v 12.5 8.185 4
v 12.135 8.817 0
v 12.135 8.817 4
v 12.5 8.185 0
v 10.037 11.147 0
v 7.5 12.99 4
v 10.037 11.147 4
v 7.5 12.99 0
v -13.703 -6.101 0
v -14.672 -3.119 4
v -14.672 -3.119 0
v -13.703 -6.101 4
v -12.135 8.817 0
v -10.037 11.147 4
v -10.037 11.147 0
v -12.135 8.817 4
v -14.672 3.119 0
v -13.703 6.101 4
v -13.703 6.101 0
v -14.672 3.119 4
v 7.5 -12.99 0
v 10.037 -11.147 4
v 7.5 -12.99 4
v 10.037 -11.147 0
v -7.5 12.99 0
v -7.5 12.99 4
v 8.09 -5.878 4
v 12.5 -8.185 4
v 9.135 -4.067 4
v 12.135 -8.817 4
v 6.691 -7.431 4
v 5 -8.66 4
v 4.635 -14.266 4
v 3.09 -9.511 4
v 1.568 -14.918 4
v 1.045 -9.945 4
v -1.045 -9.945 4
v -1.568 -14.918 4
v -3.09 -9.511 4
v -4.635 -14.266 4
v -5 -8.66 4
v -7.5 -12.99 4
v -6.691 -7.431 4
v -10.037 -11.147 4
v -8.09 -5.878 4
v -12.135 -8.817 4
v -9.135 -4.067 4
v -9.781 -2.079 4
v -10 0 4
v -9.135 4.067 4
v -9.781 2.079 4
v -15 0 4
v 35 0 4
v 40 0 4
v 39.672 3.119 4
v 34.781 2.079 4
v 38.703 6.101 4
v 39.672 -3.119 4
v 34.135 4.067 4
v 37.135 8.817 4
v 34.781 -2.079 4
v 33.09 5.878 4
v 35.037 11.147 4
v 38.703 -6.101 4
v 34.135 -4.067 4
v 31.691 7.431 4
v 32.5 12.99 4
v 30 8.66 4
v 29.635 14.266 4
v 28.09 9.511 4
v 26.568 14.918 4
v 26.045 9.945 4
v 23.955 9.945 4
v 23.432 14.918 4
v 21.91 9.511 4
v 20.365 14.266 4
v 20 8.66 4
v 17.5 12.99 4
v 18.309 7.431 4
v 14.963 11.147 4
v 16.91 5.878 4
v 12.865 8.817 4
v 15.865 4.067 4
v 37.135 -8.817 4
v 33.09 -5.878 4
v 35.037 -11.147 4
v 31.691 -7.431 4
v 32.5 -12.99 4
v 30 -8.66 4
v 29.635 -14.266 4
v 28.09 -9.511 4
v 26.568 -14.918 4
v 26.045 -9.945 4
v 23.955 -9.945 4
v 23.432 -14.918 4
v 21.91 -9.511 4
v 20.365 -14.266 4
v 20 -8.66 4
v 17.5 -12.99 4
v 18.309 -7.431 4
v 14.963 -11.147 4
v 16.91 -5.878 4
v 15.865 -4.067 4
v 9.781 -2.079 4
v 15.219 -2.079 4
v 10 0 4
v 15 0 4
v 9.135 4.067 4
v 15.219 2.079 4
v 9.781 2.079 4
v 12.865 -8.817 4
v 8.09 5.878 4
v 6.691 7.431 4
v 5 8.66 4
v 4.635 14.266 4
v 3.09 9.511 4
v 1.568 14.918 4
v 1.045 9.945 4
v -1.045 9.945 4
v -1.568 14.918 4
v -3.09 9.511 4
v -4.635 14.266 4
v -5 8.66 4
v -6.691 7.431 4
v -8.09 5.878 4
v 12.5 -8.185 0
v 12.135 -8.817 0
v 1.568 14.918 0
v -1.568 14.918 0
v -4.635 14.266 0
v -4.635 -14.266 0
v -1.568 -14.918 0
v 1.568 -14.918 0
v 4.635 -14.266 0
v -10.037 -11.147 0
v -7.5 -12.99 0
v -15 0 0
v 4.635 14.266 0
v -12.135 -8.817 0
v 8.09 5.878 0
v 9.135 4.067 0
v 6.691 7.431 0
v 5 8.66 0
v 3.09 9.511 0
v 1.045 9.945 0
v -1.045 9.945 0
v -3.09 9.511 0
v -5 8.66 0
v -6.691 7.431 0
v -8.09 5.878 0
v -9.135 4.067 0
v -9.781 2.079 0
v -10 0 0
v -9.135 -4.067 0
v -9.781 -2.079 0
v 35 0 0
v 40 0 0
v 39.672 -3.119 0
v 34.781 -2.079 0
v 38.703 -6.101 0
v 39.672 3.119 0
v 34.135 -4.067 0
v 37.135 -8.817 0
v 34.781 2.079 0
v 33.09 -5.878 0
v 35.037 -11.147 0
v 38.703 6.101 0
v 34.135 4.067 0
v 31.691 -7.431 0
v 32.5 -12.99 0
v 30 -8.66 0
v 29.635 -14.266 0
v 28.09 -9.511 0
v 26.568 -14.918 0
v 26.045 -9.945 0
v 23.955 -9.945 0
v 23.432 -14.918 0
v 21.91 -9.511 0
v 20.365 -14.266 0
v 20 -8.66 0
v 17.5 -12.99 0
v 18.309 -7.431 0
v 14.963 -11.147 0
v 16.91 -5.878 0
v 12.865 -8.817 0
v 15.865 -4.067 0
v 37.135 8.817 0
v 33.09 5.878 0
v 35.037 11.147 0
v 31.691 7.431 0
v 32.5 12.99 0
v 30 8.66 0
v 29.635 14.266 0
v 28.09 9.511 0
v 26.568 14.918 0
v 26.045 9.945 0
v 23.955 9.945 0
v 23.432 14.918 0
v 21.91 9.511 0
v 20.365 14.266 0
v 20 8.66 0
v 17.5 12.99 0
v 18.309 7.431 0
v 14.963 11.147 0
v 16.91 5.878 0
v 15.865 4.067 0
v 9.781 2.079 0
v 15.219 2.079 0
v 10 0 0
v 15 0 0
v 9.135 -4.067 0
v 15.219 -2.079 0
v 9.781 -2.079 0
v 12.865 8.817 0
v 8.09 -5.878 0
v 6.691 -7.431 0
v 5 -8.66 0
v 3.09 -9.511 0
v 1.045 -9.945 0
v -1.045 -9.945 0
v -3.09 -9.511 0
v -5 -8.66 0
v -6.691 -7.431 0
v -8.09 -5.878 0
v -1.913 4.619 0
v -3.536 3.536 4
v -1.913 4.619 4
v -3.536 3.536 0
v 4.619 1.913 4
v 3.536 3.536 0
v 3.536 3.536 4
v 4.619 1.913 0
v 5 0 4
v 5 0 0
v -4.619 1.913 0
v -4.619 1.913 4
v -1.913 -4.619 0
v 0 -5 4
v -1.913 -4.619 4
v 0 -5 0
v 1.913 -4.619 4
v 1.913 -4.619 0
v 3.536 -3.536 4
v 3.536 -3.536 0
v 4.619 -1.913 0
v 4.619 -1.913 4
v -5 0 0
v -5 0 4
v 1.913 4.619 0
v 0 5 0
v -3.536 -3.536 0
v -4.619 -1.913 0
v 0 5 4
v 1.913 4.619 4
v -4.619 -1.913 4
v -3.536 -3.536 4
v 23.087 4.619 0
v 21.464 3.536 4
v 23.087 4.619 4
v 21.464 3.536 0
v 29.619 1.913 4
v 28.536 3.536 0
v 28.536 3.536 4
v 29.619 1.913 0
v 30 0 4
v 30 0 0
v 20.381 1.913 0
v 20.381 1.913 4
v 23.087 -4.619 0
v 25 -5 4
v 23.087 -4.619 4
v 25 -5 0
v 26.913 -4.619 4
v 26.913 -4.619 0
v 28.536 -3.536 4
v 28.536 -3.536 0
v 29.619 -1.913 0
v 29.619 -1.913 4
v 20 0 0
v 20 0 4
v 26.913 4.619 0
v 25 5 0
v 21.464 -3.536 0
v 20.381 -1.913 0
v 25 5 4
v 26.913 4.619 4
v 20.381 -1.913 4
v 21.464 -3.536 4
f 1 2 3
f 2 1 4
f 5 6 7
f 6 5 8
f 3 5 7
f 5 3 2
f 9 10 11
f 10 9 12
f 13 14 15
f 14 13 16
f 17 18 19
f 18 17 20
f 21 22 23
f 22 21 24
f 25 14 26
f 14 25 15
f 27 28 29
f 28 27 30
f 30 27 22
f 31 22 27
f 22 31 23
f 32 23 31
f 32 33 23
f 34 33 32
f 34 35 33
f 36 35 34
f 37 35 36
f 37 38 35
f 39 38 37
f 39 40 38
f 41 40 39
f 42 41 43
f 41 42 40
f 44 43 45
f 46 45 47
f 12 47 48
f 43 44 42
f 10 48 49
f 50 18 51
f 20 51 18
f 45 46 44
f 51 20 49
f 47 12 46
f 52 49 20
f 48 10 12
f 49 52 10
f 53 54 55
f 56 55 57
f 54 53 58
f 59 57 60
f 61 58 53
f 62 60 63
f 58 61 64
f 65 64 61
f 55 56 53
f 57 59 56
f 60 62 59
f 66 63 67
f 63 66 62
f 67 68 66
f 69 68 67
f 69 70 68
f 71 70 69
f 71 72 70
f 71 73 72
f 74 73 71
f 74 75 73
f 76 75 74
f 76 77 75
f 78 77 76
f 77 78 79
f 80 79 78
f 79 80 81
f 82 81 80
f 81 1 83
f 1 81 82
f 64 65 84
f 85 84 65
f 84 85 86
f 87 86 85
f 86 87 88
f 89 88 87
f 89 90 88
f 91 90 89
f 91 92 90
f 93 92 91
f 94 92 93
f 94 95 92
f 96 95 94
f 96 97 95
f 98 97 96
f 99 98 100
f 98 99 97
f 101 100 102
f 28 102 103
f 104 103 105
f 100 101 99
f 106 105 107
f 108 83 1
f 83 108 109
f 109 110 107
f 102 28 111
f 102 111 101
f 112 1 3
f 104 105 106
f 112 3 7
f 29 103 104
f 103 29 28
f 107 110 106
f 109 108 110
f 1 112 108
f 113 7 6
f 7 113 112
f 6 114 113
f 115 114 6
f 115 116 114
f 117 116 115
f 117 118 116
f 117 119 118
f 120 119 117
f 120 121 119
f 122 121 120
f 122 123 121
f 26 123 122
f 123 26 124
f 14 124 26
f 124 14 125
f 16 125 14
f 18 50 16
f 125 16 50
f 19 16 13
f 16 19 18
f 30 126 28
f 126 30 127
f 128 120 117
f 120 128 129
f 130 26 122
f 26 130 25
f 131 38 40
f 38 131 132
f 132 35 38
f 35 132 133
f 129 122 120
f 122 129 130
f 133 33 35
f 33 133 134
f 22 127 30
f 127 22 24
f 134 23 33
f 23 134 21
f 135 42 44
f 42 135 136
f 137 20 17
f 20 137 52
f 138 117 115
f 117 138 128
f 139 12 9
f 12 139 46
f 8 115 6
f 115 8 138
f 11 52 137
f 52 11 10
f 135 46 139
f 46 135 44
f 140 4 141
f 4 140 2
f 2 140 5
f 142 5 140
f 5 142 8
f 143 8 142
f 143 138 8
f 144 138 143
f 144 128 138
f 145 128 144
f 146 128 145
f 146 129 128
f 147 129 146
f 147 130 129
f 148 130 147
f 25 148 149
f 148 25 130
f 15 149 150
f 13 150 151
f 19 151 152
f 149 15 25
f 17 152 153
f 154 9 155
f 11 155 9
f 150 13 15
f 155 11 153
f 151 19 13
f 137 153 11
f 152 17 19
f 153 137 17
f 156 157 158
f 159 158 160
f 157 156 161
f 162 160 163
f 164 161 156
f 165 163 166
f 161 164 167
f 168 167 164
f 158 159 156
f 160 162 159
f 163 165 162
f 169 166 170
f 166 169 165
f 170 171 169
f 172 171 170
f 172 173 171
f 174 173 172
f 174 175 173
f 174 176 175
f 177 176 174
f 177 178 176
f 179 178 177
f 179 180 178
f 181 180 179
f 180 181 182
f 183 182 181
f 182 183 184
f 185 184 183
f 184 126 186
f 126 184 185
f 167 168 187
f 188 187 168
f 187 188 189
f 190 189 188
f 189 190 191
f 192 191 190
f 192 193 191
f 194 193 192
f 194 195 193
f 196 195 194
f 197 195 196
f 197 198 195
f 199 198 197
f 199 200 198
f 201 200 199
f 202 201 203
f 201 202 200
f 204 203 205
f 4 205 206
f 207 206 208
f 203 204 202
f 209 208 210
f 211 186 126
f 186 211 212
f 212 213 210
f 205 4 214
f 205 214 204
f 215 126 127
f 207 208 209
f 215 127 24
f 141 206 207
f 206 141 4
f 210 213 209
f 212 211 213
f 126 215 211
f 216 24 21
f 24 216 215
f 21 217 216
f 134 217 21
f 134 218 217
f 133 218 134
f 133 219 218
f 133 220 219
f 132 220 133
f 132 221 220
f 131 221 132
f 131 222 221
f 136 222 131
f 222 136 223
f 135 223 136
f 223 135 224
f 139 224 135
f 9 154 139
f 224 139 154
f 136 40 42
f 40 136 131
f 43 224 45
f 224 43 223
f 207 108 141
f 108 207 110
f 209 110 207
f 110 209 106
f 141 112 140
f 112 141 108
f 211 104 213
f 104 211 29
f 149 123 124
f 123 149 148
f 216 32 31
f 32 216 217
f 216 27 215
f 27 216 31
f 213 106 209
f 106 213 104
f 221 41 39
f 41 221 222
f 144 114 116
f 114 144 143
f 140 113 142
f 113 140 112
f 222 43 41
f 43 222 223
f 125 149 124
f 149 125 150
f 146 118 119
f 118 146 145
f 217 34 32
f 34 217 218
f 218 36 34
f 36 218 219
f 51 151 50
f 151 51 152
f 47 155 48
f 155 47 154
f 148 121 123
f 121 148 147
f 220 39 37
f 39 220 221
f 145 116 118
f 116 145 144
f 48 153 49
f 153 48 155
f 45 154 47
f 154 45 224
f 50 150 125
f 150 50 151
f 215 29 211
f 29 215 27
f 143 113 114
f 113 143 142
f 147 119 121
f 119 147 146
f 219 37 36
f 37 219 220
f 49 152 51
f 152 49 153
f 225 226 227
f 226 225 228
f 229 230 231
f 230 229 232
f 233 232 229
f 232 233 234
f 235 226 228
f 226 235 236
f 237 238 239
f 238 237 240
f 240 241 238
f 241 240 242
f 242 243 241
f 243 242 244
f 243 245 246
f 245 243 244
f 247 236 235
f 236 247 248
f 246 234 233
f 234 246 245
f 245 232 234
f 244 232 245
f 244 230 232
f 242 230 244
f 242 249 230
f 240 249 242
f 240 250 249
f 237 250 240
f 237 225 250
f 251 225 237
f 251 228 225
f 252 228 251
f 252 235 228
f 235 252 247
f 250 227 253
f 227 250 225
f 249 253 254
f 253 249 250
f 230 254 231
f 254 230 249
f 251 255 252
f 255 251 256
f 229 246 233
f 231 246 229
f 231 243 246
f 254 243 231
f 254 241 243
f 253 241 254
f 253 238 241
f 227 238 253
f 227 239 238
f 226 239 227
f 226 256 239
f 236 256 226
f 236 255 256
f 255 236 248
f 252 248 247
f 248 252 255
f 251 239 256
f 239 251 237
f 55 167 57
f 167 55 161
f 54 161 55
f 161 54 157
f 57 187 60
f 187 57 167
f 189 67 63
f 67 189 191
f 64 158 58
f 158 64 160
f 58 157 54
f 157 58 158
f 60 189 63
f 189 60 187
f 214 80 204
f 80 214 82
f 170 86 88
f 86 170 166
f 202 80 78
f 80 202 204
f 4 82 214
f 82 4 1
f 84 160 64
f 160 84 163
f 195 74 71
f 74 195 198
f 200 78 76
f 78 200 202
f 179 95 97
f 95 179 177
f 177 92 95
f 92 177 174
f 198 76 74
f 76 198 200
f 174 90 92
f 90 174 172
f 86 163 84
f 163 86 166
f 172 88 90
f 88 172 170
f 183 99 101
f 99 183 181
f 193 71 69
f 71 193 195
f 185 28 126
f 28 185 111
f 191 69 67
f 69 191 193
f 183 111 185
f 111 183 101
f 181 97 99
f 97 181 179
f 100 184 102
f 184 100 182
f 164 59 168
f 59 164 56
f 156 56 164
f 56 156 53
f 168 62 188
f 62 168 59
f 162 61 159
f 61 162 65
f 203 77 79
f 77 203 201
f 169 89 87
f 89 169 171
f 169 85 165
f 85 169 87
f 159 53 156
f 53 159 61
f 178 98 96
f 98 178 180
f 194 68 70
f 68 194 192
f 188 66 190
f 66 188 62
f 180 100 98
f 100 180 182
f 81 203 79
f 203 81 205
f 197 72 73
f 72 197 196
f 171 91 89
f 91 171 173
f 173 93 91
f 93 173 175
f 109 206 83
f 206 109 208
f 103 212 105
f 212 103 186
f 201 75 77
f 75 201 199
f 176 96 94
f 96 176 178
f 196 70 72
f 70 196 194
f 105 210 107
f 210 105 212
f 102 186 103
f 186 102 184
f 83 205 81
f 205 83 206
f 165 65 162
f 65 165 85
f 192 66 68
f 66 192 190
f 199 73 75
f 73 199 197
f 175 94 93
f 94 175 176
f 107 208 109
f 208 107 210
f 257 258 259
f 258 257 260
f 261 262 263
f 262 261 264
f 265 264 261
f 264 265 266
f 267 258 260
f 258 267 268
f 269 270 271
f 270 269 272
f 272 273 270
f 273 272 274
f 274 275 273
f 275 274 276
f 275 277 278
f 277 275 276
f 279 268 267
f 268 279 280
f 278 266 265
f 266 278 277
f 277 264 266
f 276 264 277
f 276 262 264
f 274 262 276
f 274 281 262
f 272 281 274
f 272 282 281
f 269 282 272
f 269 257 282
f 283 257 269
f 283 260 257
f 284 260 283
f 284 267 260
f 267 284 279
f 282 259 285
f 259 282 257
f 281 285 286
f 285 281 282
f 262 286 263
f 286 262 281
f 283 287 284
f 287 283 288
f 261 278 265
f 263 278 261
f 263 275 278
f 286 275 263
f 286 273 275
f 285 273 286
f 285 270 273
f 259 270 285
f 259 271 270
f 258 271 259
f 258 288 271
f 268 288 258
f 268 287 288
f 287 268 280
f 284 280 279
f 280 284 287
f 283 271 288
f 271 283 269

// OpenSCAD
module target() {
	difference() {
		cylinder(r=15, h=4);
		cylinder(r=10, h=4);
	}
	cylinder(r=5, h=4);
}

target();
translate([25, 0, 0])
	target();
